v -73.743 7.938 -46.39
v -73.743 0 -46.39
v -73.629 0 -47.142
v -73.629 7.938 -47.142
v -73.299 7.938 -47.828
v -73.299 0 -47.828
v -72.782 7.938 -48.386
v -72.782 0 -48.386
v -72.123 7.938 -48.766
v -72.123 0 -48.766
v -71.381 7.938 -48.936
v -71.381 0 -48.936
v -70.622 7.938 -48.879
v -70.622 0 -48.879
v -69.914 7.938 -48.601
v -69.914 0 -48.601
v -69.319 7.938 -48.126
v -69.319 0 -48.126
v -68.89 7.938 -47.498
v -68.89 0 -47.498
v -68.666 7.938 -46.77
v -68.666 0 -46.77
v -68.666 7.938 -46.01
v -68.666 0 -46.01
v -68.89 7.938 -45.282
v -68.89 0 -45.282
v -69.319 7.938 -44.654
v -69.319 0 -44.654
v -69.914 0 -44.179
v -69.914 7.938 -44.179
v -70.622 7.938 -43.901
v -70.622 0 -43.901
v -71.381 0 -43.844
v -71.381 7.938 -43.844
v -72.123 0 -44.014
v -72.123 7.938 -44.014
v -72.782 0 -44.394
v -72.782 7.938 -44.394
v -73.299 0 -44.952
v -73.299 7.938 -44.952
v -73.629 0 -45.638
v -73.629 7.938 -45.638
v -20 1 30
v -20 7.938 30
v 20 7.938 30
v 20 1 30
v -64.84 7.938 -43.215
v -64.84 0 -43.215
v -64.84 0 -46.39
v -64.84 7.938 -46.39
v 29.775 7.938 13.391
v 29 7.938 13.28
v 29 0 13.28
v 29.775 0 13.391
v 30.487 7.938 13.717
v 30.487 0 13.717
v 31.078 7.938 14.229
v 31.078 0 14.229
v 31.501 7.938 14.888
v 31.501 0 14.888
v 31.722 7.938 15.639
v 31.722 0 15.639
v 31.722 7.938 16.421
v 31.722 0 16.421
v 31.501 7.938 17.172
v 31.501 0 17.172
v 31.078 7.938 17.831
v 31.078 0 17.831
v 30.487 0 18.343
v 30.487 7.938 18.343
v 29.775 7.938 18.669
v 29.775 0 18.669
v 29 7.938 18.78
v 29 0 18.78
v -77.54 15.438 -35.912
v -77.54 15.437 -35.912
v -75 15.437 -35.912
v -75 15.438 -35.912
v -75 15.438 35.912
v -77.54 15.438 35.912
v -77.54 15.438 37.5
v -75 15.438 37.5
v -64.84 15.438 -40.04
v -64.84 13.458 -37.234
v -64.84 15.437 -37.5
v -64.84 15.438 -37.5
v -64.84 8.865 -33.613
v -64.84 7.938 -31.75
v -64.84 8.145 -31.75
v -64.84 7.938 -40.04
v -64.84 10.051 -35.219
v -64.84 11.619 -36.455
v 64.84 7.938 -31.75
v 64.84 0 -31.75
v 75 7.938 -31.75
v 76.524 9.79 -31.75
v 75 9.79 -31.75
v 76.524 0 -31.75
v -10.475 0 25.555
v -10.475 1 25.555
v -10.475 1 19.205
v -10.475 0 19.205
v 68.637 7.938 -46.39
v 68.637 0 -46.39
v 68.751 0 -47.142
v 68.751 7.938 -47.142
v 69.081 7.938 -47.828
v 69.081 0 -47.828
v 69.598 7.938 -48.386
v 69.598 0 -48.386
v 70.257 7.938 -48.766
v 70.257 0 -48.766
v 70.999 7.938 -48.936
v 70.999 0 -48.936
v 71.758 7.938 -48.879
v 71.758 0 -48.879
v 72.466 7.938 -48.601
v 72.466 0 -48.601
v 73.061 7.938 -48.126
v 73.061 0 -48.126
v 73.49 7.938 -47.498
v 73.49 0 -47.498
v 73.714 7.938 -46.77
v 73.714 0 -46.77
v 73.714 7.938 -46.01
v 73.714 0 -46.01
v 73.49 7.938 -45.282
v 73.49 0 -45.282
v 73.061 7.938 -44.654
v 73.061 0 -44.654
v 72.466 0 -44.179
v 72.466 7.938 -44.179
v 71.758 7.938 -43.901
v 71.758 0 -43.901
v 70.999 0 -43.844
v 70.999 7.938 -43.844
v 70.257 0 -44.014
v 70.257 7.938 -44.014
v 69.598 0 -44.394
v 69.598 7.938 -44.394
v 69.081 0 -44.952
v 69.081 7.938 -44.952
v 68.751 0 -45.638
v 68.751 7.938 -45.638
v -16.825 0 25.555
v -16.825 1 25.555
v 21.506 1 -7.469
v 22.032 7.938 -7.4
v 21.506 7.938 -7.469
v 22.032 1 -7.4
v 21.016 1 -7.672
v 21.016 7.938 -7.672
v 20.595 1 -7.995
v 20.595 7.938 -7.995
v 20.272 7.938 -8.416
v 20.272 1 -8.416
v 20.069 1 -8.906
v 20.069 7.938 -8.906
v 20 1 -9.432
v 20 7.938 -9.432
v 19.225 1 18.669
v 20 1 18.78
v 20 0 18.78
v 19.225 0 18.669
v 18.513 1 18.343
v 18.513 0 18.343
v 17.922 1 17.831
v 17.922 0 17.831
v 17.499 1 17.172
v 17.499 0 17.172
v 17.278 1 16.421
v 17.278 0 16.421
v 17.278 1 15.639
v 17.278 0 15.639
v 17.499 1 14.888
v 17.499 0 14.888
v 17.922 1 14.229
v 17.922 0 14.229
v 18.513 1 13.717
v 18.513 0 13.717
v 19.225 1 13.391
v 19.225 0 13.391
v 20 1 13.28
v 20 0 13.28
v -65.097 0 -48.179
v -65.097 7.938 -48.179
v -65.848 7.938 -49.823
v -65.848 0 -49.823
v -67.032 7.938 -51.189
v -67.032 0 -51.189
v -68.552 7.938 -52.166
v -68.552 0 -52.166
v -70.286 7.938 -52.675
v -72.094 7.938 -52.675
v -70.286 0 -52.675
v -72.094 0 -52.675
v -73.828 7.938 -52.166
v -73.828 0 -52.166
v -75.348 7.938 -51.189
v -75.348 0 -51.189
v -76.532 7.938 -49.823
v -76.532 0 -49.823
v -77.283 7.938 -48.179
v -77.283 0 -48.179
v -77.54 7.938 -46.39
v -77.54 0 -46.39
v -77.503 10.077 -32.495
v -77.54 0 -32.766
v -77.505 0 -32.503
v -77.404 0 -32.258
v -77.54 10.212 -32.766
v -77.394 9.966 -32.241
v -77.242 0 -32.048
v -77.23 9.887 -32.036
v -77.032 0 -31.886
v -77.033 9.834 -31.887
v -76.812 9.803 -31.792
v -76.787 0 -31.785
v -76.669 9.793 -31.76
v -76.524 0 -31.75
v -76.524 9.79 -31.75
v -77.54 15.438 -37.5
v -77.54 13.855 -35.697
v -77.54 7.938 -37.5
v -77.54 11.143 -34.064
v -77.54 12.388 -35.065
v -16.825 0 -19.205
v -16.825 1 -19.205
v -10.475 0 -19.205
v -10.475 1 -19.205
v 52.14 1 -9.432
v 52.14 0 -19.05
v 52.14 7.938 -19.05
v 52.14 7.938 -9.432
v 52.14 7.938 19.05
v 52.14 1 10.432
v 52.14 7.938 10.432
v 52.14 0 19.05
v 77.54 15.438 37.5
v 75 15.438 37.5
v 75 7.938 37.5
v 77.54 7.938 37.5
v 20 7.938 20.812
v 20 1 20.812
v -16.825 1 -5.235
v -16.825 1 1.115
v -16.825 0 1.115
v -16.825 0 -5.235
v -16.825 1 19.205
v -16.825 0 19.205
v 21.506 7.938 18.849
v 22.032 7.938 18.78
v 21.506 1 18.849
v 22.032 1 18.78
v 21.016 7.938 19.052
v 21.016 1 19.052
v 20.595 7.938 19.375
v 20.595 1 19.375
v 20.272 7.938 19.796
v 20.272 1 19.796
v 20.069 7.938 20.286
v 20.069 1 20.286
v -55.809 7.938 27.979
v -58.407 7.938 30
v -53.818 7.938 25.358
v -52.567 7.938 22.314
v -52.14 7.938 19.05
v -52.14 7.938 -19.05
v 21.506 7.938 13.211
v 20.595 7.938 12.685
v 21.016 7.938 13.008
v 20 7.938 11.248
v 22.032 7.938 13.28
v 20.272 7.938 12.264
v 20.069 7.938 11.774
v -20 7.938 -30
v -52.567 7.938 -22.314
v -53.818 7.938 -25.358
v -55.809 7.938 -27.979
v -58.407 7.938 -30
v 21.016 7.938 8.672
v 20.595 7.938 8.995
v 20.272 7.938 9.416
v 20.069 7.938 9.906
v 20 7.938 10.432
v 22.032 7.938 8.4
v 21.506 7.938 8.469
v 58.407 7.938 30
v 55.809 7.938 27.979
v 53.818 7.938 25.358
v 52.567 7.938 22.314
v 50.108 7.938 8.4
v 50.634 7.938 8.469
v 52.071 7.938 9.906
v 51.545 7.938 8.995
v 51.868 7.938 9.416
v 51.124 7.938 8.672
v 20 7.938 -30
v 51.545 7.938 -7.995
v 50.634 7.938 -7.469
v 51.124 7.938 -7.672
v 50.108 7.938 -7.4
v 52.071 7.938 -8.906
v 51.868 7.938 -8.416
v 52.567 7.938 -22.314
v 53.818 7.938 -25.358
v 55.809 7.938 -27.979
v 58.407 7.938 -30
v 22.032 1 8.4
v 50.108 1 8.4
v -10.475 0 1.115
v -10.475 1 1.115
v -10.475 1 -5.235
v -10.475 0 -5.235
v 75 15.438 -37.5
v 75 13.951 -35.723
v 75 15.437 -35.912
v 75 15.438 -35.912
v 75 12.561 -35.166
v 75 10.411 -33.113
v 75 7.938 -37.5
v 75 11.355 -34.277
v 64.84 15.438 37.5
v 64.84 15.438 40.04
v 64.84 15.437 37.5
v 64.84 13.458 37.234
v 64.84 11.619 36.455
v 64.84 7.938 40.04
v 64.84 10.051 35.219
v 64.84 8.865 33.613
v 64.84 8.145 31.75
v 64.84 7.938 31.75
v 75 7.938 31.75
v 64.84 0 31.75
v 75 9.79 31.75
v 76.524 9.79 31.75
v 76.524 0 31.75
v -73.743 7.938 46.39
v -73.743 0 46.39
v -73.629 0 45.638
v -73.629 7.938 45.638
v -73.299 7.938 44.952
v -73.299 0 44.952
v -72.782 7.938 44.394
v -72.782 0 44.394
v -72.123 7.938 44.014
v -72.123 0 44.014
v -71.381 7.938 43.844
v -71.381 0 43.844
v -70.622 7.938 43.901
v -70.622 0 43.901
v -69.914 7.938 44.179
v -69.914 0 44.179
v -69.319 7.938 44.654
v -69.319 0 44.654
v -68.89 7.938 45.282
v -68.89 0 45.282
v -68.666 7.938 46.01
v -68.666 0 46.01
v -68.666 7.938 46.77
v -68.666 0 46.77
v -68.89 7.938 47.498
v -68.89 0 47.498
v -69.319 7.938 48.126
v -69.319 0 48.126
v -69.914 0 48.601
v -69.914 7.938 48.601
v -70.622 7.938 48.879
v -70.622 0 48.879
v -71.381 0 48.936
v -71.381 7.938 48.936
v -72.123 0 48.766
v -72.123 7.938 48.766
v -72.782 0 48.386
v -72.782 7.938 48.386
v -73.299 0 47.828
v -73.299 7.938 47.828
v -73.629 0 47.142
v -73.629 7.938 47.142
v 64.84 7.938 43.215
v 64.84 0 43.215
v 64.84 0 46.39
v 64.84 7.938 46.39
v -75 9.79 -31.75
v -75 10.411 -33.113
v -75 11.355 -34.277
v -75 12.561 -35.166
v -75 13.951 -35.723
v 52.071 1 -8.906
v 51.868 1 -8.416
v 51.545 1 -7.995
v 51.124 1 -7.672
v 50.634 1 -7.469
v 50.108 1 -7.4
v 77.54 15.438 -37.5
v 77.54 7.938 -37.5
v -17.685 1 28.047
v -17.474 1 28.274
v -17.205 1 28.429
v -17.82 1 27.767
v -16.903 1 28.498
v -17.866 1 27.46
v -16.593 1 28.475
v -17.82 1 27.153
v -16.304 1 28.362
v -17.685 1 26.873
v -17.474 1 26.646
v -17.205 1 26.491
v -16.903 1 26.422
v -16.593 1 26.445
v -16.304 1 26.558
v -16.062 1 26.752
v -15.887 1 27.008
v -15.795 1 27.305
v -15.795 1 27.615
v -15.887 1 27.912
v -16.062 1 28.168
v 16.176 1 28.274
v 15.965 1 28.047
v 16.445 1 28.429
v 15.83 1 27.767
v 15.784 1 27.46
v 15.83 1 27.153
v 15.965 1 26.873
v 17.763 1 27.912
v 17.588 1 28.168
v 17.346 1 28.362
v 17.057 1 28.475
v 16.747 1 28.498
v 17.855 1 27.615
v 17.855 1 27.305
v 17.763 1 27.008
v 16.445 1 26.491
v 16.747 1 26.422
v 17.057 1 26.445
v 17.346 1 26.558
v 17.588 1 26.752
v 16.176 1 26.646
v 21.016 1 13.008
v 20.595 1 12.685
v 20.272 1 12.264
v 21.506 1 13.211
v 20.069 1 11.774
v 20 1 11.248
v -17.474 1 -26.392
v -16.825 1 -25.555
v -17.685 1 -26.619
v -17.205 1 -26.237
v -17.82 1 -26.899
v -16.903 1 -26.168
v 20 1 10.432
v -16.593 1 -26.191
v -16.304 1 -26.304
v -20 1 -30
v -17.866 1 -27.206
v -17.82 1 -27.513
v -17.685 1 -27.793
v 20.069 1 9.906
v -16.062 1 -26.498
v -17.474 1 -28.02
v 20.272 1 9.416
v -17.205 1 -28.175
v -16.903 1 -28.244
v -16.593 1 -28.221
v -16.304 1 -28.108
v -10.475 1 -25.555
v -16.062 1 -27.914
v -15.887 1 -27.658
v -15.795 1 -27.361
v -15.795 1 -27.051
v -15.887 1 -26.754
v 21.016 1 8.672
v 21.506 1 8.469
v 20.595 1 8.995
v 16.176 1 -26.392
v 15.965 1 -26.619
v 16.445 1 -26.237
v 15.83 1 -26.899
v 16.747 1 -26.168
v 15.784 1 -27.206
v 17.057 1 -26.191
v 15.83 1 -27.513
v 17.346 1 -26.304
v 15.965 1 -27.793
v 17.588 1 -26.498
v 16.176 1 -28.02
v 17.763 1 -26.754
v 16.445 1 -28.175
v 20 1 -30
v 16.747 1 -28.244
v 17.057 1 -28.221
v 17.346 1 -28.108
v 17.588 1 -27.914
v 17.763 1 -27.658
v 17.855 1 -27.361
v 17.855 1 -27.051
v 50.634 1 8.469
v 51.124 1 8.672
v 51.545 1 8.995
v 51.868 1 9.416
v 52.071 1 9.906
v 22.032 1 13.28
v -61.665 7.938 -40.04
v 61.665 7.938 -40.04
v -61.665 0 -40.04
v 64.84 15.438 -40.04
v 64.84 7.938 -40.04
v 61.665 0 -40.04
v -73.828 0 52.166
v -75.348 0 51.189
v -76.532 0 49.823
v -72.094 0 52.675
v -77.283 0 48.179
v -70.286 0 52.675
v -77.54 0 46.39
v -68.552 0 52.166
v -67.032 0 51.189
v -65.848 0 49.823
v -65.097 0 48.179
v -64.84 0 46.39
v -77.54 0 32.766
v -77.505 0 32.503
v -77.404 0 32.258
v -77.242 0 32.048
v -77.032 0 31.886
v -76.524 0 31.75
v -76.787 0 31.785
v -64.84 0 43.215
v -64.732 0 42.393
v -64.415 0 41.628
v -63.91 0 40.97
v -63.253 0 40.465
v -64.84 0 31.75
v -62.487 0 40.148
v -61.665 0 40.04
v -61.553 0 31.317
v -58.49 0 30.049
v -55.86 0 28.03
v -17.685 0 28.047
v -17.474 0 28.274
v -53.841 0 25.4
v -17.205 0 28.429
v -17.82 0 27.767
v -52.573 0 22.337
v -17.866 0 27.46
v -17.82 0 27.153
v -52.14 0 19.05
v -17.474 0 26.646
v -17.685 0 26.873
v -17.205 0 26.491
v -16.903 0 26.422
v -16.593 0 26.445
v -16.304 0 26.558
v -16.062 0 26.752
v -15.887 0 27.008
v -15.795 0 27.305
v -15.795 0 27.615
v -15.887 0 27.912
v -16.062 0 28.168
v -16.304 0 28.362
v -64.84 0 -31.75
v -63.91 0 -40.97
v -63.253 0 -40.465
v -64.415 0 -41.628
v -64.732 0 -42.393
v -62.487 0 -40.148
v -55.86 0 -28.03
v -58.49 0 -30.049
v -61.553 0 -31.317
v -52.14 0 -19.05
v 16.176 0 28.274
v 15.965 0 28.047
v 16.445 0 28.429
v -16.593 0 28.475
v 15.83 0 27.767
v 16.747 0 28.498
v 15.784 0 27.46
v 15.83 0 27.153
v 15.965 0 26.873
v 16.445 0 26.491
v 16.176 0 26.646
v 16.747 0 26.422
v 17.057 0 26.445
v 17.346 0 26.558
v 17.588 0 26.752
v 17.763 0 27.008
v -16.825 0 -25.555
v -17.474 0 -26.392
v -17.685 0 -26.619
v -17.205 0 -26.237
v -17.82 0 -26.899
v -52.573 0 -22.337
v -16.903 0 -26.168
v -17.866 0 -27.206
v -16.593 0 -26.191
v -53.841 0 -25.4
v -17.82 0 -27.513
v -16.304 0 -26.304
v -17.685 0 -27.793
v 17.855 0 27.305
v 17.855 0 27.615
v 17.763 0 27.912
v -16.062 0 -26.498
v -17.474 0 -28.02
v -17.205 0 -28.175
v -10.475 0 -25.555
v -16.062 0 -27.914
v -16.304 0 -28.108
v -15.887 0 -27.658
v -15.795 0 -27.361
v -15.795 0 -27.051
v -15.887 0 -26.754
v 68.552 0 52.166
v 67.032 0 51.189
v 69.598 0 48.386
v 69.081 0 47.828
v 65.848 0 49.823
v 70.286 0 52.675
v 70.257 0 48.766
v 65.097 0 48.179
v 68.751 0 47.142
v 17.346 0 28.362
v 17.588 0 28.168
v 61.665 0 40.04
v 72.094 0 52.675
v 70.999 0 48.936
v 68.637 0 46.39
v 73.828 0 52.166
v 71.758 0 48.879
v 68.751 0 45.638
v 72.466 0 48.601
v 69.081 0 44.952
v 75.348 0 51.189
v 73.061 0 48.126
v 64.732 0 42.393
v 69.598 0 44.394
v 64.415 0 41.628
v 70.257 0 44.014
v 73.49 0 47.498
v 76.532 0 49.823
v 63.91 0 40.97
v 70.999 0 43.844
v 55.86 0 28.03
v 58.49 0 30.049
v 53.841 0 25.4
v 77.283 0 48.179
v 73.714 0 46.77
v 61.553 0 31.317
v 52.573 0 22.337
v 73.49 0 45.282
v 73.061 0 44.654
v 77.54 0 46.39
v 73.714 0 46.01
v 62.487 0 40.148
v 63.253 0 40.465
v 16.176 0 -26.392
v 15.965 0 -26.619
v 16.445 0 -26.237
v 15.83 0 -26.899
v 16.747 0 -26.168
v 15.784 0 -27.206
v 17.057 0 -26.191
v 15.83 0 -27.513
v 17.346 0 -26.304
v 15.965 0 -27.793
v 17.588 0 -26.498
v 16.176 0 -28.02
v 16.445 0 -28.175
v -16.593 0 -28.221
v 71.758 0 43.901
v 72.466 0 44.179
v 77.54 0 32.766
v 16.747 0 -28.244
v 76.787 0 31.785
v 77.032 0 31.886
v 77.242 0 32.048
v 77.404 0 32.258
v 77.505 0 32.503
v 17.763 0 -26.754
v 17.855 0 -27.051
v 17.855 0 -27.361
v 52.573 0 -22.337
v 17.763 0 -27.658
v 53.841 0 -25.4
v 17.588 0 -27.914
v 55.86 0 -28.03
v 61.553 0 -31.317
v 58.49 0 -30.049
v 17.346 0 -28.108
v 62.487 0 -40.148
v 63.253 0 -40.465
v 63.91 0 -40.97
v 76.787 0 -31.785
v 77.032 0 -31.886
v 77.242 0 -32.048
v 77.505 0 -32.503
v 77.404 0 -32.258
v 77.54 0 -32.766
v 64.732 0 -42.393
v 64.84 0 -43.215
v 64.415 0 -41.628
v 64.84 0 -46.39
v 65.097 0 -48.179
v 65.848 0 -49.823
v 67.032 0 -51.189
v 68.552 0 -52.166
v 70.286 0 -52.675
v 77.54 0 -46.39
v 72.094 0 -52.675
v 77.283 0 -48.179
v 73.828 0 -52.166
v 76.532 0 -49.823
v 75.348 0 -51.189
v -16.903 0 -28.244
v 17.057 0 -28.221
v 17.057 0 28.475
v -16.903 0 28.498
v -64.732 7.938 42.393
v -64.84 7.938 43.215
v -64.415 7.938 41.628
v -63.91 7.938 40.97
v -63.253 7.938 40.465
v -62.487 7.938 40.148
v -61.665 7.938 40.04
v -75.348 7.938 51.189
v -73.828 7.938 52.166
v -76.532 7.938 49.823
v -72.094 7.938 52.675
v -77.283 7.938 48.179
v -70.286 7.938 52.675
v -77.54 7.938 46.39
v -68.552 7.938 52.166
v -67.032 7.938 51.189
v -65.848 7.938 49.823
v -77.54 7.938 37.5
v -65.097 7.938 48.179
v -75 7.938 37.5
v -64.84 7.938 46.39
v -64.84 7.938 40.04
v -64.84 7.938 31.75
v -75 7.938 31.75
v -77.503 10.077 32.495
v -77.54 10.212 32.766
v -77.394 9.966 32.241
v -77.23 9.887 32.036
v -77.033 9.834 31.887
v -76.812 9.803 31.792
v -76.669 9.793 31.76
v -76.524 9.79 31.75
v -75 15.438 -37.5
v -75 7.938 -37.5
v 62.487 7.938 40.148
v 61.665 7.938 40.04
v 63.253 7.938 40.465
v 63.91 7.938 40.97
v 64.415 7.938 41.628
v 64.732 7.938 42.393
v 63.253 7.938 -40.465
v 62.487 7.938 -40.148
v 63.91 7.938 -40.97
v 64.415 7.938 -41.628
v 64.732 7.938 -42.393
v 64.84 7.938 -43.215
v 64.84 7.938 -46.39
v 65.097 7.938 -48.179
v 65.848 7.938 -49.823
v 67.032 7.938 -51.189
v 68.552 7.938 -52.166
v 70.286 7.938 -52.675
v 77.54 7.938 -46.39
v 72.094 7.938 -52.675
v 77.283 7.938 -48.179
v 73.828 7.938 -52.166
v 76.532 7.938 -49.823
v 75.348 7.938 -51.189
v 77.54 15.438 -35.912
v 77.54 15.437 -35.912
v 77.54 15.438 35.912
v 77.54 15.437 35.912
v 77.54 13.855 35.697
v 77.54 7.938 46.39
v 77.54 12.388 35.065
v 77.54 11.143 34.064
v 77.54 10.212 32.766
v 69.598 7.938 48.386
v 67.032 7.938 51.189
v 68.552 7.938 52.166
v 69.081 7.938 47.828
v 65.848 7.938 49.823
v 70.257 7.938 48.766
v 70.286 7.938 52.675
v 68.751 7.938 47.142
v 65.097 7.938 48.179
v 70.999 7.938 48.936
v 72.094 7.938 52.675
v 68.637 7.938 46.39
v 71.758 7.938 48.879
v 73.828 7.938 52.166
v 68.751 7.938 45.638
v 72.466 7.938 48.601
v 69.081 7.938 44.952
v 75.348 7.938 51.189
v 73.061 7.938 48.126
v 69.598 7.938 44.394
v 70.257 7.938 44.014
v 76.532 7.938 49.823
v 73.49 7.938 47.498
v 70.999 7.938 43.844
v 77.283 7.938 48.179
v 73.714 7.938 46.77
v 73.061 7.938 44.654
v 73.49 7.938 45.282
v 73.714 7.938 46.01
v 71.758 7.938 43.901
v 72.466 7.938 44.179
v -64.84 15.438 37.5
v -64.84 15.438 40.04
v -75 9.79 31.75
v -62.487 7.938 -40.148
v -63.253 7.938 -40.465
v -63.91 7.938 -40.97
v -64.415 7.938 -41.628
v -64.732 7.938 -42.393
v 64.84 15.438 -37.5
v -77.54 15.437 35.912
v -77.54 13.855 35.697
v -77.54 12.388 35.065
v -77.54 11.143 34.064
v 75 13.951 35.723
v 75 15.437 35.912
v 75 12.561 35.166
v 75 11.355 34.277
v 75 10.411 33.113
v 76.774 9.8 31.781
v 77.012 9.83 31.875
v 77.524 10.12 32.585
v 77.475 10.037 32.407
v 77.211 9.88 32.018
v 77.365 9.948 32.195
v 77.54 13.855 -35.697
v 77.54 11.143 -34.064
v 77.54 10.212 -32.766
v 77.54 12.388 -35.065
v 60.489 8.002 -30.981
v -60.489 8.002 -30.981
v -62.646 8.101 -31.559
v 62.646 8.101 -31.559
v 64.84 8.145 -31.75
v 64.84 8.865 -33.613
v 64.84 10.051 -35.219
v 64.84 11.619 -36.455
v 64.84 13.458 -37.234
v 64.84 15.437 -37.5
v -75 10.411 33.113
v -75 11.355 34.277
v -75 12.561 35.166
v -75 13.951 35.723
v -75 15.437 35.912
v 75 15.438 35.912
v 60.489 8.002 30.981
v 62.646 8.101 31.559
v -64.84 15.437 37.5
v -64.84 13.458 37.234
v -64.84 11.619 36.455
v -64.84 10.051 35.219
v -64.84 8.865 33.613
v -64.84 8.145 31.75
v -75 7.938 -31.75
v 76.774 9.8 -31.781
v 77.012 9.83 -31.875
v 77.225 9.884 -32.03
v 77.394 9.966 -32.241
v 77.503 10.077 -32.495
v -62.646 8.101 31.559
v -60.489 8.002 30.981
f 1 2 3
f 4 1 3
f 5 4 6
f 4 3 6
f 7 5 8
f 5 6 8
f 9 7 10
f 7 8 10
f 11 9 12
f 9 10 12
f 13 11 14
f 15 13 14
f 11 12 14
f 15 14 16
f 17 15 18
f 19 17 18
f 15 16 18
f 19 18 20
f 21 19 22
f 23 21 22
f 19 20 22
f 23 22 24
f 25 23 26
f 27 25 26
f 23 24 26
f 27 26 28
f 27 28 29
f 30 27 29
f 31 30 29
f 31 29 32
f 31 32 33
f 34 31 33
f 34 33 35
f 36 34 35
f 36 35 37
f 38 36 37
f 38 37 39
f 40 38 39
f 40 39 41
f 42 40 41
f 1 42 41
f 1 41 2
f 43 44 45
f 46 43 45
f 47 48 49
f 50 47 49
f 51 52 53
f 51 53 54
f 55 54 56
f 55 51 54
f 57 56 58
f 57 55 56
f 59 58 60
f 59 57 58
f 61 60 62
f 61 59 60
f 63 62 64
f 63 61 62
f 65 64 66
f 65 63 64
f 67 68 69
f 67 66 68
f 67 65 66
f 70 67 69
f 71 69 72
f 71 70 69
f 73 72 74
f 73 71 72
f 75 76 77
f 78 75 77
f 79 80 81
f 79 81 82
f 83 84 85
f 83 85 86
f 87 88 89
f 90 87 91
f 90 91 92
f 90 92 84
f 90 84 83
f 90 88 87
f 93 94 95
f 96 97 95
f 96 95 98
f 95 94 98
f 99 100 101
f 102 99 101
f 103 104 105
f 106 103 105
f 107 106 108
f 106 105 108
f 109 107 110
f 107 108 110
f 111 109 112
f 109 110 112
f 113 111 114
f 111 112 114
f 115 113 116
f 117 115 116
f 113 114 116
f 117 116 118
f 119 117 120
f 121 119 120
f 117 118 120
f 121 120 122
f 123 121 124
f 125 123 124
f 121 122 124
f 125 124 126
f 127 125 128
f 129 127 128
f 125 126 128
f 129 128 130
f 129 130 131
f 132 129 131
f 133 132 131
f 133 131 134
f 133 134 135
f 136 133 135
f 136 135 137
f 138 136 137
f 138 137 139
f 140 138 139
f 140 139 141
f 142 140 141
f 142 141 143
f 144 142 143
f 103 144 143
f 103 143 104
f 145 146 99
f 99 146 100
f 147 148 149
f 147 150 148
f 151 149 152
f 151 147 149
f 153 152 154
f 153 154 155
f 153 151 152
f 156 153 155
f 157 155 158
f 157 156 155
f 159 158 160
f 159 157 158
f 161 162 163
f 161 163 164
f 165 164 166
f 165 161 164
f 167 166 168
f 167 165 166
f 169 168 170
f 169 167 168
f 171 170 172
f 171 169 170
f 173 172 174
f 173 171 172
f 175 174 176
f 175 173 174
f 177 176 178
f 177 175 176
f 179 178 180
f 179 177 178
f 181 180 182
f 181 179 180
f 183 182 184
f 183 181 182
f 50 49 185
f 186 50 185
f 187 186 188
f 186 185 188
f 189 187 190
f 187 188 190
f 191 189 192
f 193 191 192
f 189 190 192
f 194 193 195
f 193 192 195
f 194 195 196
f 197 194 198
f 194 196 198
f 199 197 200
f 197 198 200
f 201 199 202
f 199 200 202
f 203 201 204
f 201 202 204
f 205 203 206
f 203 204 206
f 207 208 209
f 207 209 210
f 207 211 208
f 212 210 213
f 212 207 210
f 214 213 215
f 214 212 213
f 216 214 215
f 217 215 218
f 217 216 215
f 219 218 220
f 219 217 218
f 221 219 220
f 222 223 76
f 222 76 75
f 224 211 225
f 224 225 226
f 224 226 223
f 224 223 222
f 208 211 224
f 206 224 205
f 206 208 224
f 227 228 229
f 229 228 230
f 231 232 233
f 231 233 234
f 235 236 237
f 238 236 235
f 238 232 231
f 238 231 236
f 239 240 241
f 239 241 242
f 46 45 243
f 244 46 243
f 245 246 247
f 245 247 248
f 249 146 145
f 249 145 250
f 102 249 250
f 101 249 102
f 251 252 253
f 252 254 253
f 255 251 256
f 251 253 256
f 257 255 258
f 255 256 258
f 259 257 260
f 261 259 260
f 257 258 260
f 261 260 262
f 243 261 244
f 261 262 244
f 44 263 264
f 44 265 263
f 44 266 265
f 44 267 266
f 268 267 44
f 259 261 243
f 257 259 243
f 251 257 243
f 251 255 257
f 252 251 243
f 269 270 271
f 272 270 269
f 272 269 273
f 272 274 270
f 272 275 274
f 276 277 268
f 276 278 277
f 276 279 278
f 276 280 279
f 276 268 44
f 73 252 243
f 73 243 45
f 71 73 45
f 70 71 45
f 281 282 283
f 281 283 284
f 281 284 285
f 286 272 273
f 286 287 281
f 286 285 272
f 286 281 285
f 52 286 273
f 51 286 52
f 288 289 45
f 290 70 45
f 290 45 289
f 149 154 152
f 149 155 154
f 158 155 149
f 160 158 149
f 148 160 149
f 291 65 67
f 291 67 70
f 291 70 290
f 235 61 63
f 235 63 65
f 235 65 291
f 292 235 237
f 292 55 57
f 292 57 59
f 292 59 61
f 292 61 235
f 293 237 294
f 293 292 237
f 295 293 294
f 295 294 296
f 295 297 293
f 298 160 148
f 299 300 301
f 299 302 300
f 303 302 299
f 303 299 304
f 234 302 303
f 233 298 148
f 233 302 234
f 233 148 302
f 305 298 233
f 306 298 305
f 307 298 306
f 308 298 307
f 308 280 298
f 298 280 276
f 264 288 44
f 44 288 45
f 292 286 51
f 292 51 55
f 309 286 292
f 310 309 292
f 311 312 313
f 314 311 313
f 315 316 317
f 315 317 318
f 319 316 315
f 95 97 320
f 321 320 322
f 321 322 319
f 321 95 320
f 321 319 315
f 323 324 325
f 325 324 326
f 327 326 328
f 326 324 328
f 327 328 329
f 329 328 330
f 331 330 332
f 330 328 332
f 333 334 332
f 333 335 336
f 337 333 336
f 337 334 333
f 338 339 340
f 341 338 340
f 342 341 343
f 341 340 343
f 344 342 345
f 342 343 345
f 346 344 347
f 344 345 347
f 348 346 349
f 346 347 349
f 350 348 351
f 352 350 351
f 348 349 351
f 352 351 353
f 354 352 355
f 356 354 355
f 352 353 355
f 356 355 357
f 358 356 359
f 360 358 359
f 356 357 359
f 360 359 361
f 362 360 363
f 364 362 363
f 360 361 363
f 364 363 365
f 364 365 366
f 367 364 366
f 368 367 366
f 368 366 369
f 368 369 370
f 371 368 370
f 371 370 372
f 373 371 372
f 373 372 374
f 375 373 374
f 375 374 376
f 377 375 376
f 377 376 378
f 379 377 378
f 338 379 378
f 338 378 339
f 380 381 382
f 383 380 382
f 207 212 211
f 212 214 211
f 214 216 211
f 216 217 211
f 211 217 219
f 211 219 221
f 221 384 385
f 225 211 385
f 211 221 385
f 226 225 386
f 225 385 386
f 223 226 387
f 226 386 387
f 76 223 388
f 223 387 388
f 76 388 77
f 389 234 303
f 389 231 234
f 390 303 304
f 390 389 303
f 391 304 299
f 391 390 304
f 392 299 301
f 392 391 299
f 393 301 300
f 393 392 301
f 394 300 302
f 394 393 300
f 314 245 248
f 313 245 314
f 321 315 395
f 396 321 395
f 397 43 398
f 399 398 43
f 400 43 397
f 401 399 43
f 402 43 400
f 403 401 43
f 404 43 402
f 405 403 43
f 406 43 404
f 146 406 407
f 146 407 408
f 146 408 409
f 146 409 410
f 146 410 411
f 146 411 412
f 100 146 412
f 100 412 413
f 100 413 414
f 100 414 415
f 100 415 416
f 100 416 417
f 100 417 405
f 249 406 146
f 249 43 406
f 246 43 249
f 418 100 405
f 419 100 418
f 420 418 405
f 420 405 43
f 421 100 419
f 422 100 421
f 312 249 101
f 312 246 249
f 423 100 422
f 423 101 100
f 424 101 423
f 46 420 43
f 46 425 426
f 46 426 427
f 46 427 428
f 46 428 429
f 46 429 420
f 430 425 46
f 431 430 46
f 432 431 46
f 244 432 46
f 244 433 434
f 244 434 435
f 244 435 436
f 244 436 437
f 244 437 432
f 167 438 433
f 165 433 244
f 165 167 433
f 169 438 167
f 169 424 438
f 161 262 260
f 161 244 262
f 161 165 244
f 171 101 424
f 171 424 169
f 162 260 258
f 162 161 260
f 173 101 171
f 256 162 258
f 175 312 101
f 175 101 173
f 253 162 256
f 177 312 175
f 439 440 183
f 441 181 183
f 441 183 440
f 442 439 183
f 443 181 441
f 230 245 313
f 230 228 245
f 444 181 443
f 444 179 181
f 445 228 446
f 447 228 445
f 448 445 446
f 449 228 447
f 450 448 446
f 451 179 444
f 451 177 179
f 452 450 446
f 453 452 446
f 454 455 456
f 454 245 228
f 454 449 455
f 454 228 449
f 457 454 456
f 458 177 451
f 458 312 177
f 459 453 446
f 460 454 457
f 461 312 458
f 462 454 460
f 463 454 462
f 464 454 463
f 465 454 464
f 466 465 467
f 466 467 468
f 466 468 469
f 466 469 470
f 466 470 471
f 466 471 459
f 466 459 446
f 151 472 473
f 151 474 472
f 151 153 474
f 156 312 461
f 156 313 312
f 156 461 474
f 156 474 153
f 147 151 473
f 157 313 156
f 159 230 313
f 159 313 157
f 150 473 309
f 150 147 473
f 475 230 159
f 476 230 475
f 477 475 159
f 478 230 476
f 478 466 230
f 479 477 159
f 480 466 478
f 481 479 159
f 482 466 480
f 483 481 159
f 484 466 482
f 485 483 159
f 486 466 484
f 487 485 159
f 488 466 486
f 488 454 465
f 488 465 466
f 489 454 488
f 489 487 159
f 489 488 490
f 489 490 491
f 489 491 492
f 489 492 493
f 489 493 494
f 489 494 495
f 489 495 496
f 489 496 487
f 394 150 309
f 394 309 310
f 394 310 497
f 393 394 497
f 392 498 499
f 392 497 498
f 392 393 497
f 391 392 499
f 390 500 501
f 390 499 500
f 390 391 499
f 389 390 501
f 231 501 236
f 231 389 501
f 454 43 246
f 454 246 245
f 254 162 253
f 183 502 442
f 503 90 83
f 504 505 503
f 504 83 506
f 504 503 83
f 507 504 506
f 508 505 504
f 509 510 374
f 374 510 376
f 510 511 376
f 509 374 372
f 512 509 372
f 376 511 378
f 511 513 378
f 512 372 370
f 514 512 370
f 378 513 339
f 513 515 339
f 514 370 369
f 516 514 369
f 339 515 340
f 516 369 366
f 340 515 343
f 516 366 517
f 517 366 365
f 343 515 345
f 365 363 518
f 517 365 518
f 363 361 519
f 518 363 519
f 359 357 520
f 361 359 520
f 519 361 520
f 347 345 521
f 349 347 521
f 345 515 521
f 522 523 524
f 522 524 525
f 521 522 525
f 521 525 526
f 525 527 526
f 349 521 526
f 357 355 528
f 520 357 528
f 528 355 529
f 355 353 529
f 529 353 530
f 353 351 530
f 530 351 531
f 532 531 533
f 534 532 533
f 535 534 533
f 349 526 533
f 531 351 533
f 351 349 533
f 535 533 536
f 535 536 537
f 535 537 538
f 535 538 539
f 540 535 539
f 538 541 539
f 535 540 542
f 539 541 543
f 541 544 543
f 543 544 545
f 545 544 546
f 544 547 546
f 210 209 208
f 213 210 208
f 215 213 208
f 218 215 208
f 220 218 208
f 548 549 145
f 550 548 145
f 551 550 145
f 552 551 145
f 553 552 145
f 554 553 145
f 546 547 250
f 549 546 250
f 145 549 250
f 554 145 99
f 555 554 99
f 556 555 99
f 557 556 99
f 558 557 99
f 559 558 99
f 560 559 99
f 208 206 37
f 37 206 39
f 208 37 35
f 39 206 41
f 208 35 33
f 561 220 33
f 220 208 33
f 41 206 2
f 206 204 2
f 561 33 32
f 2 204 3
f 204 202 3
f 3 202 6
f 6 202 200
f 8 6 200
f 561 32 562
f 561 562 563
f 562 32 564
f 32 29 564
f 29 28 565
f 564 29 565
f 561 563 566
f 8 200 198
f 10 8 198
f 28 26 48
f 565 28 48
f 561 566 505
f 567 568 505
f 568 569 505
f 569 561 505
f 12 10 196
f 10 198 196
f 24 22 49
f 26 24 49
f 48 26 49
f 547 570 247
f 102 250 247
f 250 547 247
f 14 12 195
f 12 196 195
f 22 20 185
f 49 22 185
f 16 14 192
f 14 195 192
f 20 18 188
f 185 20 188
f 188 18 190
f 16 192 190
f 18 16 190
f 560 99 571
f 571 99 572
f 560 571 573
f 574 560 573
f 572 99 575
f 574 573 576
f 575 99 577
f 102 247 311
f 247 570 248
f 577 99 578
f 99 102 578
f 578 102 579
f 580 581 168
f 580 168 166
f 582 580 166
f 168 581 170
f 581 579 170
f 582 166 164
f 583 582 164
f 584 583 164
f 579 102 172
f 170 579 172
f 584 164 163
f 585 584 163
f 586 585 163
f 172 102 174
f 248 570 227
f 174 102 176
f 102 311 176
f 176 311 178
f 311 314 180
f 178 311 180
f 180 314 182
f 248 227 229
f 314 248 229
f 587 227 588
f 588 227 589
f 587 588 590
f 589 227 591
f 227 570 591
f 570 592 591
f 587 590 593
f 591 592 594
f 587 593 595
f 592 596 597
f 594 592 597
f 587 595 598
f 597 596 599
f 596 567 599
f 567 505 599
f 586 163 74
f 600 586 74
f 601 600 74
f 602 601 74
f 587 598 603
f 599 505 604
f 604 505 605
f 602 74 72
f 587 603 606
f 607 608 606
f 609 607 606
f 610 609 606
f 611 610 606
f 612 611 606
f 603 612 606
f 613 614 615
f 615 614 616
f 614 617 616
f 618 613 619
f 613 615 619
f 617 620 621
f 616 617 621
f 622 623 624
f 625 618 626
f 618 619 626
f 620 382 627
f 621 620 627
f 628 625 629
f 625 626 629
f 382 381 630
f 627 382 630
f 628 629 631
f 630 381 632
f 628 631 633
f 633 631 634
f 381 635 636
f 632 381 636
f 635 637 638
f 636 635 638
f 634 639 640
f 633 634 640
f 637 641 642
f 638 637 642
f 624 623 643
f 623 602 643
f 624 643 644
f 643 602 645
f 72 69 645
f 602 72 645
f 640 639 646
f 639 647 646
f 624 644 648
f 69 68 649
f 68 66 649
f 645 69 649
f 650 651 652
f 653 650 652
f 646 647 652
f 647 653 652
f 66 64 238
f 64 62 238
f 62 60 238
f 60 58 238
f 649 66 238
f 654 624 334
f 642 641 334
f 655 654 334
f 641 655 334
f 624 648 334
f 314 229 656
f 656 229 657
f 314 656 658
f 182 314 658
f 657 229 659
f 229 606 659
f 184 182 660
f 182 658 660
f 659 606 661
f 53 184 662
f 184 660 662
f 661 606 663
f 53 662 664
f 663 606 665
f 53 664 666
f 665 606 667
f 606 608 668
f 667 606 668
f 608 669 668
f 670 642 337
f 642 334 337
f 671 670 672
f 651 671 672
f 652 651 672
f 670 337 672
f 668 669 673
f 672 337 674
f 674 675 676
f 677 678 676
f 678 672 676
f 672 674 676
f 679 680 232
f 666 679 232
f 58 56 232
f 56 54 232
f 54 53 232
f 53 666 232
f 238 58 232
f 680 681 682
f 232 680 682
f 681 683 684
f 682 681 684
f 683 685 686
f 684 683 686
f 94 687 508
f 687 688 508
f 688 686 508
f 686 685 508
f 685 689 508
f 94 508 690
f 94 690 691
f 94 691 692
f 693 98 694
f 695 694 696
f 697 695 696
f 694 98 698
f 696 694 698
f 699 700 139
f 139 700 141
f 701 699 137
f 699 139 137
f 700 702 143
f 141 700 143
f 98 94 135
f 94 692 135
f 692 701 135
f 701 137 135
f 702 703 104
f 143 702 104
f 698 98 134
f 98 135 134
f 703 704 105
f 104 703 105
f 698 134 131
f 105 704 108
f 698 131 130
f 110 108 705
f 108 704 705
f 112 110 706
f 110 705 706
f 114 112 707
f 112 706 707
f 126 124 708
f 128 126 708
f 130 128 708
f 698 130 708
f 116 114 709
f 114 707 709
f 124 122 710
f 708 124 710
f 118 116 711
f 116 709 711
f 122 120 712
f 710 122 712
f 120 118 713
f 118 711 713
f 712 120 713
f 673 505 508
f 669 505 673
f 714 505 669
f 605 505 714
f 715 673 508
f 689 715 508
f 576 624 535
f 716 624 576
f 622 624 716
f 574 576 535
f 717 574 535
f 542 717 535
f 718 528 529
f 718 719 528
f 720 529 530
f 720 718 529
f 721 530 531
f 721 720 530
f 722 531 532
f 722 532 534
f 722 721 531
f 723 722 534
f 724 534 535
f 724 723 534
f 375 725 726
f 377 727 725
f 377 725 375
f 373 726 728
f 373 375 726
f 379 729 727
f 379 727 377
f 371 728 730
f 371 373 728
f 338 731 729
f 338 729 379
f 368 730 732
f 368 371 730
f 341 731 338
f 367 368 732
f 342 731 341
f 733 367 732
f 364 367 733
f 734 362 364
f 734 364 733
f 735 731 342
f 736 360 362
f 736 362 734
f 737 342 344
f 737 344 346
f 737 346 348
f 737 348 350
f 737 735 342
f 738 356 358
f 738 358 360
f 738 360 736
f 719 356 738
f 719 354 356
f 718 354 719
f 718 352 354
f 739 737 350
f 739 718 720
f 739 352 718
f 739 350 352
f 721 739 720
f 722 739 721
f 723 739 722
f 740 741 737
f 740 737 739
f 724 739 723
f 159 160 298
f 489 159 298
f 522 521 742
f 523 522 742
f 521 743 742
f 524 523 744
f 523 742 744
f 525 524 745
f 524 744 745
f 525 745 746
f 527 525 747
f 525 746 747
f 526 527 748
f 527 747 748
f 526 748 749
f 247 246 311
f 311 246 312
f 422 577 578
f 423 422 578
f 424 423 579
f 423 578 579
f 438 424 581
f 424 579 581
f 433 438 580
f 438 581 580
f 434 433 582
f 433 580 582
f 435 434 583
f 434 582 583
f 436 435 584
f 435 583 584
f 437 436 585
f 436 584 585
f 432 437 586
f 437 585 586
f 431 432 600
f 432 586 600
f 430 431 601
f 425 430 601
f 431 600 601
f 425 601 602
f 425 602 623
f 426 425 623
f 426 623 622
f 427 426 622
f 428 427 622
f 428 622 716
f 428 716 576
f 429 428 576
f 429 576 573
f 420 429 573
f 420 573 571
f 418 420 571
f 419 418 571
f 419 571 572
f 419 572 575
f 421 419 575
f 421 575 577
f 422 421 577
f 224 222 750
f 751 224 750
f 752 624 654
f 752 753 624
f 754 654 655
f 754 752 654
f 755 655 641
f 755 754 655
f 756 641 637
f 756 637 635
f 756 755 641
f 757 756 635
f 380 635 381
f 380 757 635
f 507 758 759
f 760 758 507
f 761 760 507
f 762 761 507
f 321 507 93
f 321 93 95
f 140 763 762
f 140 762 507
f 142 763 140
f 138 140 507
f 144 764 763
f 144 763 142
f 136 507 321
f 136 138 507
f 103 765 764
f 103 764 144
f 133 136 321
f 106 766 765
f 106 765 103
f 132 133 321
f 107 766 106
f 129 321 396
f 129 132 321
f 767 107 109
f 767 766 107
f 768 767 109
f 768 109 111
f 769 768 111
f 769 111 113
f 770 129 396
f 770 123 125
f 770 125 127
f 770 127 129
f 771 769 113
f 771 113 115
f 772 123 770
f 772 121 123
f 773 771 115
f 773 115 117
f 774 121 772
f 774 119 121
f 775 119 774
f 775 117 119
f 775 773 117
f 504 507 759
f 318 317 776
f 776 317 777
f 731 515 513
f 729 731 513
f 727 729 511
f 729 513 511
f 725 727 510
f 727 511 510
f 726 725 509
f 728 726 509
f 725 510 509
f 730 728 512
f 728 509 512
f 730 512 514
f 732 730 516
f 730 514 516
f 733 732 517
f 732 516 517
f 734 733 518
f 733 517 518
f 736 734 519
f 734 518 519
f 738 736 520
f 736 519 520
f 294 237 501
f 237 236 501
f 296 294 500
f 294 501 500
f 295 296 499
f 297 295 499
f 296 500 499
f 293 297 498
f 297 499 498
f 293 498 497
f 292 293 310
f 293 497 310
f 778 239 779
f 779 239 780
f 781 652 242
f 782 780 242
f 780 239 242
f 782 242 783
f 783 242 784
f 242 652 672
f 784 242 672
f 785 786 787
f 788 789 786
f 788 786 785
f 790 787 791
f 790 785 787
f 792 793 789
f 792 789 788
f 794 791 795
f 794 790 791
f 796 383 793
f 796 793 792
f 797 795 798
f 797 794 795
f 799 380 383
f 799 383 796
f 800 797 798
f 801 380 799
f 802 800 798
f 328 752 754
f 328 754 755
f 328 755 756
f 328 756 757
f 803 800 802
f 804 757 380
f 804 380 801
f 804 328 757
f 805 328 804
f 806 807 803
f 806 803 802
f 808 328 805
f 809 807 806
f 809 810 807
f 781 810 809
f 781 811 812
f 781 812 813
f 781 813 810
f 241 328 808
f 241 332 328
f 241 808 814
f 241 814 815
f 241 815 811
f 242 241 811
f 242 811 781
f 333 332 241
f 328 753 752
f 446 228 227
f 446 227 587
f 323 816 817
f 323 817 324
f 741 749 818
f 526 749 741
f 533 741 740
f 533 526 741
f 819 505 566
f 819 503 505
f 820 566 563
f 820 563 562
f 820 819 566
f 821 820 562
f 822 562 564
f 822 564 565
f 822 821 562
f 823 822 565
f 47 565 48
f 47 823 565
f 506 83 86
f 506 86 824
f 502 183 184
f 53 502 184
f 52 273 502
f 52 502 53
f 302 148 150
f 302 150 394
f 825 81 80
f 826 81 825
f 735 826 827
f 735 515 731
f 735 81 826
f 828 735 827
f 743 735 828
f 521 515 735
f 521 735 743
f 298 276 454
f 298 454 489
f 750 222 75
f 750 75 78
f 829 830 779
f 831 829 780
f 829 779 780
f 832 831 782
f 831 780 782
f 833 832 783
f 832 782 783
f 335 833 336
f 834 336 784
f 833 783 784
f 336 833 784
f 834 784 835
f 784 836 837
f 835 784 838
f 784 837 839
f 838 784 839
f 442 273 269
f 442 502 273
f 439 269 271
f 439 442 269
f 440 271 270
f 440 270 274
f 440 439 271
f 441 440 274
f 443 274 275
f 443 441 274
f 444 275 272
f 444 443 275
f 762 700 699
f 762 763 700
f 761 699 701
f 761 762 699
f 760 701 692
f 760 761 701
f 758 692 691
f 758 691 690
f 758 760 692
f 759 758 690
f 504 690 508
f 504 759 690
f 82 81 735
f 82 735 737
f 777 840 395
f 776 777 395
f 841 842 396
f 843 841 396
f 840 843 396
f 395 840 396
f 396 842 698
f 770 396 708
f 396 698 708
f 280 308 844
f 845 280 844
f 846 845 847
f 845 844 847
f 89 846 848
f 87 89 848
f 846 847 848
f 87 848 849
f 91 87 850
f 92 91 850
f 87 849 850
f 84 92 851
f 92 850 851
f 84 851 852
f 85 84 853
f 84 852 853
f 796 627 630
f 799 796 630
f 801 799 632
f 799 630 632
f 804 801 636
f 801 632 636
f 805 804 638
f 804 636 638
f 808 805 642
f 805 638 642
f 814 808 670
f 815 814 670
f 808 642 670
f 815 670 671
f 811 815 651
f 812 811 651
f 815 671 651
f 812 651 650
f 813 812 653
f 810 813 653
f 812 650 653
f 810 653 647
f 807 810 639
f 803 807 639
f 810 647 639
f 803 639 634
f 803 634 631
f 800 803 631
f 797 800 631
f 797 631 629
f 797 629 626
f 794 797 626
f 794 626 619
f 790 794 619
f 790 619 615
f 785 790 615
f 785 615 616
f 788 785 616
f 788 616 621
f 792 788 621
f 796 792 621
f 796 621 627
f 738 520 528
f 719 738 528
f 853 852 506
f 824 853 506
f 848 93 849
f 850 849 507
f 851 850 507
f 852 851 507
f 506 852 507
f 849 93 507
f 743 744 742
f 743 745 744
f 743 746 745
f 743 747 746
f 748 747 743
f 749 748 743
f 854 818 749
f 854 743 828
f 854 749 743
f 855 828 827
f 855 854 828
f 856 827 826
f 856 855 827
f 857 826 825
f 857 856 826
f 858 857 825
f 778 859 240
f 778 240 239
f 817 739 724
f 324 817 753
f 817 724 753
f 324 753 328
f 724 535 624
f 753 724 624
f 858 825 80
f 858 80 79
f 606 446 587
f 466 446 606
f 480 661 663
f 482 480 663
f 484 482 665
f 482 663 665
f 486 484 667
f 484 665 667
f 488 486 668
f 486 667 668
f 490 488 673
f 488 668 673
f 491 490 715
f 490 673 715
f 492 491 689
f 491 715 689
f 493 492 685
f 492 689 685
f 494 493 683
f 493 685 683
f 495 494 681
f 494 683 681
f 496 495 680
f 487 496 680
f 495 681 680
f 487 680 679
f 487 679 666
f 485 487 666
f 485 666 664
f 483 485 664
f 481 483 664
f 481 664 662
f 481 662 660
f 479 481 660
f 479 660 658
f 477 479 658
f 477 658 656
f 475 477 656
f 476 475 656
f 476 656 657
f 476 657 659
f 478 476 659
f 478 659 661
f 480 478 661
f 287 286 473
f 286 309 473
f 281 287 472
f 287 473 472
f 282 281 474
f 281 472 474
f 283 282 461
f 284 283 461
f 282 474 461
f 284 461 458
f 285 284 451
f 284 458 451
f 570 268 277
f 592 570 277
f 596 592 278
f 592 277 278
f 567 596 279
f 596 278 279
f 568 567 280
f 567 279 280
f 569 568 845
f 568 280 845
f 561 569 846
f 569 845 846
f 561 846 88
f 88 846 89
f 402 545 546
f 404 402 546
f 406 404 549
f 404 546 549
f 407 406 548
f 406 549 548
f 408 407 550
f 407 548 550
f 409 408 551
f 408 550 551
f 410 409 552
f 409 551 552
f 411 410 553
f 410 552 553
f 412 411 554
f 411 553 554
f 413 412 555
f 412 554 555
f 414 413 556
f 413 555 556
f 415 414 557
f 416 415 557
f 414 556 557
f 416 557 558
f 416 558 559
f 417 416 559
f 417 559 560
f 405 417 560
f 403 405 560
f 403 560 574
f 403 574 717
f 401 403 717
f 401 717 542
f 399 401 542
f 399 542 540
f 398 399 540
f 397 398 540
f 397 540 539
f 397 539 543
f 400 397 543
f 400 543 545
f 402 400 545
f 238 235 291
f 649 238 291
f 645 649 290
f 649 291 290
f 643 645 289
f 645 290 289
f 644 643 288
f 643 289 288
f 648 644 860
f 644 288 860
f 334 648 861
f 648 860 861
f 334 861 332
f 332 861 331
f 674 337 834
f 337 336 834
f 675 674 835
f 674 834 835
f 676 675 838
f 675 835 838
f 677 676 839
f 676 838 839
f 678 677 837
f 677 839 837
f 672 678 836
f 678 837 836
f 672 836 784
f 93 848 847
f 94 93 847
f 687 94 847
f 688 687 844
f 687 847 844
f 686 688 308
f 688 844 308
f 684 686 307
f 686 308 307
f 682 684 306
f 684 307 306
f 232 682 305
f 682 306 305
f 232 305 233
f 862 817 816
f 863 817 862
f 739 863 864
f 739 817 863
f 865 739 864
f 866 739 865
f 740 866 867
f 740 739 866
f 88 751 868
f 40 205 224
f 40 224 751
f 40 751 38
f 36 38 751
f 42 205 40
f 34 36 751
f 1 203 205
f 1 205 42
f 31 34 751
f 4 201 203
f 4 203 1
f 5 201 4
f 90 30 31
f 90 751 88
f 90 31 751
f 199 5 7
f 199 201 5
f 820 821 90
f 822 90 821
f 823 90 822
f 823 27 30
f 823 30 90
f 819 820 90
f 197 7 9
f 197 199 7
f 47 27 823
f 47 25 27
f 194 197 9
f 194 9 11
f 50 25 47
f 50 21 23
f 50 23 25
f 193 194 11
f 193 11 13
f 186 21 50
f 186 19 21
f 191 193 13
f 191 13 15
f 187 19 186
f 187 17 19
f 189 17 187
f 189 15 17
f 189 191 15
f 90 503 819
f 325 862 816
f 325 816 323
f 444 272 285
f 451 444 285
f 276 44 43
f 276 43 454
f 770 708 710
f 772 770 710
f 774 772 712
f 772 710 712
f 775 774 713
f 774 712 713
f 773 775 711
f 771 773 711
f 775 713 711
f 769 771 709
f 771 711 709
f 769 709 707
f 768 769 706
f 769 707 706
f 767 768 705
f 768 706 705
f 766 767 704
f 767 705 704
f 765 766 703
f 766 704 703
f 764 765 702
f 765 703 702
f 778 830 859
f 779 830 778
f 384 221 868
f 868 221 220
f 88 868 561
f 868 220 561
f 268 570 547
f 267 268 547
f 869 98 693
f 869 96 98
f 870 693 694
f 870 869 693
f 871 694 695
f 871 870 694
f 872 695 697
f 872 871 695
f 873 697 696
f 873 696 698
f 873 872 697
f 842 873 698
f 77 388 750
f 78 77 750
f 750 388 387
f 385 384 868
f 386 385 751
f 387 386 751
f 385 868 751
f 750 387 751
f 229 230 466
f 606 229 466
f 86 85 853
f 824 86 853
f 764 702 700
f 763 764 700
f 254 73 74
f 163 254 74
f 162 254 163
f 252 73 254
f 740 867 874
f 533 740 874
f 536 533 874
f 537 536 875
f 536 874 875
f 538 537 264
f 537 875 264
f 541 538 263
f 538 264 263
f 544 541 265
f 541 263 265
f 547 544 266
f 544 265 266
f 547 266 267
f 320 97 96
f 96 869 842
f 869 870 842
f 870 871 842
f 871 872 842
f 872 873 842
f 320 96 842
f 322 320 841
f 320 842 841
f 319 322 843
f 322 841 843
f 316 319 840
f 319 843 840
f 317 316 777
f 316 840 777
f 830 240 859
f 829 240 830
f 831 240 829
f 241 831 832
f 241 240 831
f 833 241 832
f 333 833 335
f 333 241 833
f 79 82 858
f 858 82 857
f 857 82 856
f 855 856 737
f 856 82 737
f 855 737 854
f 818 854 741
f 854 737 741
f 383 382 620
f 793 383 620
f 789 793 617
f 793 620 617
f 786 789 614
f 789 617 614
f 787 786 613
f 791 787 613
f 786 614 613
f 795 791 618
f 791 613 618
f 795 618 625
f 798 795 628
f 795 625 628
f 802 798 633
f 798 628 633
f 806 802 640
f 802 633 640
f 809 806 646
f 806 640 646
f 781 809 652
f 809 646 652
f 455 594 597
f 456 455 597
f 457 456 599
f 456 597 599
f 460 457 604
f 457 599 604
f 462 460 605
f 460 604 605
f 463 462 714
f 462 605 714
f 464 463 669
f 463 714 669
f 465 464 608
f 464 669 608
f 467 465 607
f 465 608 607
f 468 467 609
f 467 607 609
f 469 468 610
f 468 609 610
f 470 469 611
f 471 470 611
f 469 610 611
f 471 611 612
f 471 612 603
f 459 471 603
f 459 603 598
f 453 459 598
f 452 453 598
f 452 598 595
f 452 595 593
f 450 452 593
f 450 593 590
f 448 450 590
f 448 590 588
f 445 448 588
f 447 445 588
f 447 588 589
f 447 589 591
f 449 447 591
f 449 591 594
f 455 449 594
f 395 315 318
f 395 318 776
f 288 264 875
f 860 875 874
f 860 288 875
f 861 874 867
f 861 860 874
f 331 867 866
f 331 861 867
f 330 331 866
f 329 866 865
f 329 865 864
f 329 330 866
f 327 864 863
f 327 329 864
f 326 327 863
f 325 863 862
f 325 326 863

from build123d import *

# Parameters (mm, degrees)
BOSS_EXTRUDE1_DEPTH         = 7.9375
F_10_CLEARANCE_HOLE1_D      = 5.1054
SKETCH8_W                   = 2.54
SKETCH8_H                   = 1.5875
SKETCH8_W_2                 = 129.68
SKETCH8_H_2                 = 2.54
BOSS_EXTRUDE2_DEPTH         = 7.5
SKETCH10_W                  = 2.54
SKETCH10_H                  = 71.825
BOSS_EXTRUDE3_DEPTH         = 1.5875
FILLET3_R                   = 3.175
FILLET4_R                   = 5.9125
FILLET5_R                   = 7.5
SKETCH11_W                  = 25.4
SKETCH11_H                  = 63.5
CUT_EXTRUDE1_DEPTH          = 96.03828495
FILLET6_R                   = 12.7
SKETCH12_W                  = 40
SKETCH12_H                  = 60
CUT_EXTRUDE2_DEPTH          = 6.9375
SKETCH13_W                  = 57.54
SKETCH13_H                  = 15.8
CUT_EXTRUDE3_DEPTH          = 6.9375
CUT_EXTRUDE4_DEPTH          = 95.111439835
SKETCH15_W                  = 6.35
SKETCH15_H                  = 6.35
CUT_EXTRUDE5_DEPTH          = 95.880981267
FILLET7_R                   = 2.032
F_45_0_082_DIAMETER_HOLE1_D = 2.0828
FILLET8_R                   = 1.016


with BuildPart() as part:
    # Sketch1 → Boss-Extrude1 (new body)
    with BuildSketch(Plane(origin=(0, 0, 0), x_dir=(1, 0, 0), z_dir=(0, 1, 0))):
        with BuildLine():
            Line((77.54, -40.04), (77.54, 40.04))
            Line((77.54, 40.04), (77.54, 46.39))
            ThreePointArc((77.54, 46.39), (71.19, 52.74), (64.84, 46.39))
            Line((64.84, 46.39), (64.84, 40.04))
            Line((64.84, 40.04), (-64.84, 40.04))
            Line((-64.84, 40.04), (-64.84, 46.39))
            ThreePointArc((-64.84, 46.39), (-71.19, 52.74), (-77.54, 46.39))
            Line((-77.54, 46.39), (-77.54, 40.04))
            Line((-77.54, 40.04), (-77.54, -40.04))
            Line((-77.54, -40.04), (-77.54, -46.39))
            ThreePointArc((-77.54, -46.39), (-71.19, -52.74), (-64.84, -46.39))
            Line((-64.84, -46.39), (-64.84, -40.04))
            Line((-64.84, -40.04), (64.84, -40.04))
            Line((64.84, -40.04), (64.84, -46.39))
            ThreePointArc((64.84, -46.39), (71.19, -52.74), (77.54, -46.39))
            Line((77.54, -46.39), (77.54, -40.04))
        make_face()
    extrude(amount=BOSS_EXTRUDE1_DEPTH)

    # #10 Clearance Hole1 (through all)
    with Locations(Plane(origin=(0, 7.9375, 0), x_dir=(1, 0, 0), z_dir=(0, 1, 0))):
        with Locations((-71.19, 46.39), (71.19, 46.39), (71.19, -46.39), (-71.19, -46.39)):
            Hole(F_10_CLEARANCE_HOLE1_D / 2)

    # Sketch8 → Boss-Extrude2 (add)
    with BuildSketch(Plane(origin=(0, 7.9375, 0), x_dir=(1, 0, 0), z_dir=(0, 1, 0))):
        with Locations((-76.27, 36.70625)):
            Rectangle(SKETCH8_W, SKETCH8_H)
        with Locations((76.27, 36.70625)):
            Rectangle(SKETCH8_W, SKETCH8_H)
        with Locations((76.27, -36.70625)):
            Rectangle(SKETCH8_W, SKETCH8_H)
        with Locations((-76.27, -36.70625)):
            Rectangle(SKETCH8_W, SKETCH8_H)
        with Locations((0, 38.77)):
            Rectangle(SKETCH8_W_2, SKETCH8_H_2)
        with Locations((0, -38.77)):
            Rectangle(SKETCH8_W_2, SKETCH8_H_2)
    extrude(amount=BOSS_EXTRUDE2_DEPTH)

    # Sketch10 → Boss-Extrude3 (add)
    with BuildSketch(Plane(origin=(0, 7.9375, 0), x_dir=(1, 0, 0), z_dir=(0, 1, 0))):
        with Locations((-76.27, 0)):
            Rectangle(SKETCH10_W, SKETCH10_H)
        with Locations((76.27, 0)):
            Rectangle(SKETCH10_W, SKETCH10_H)
    extrude(amount=BOSS_EXTRUDE3_DEPTH)

    # Fillet3
    fillet3_edges = [part.edges().sort_by_distance(p)[0] for p in [
        (64.84, 3.96875, 40.04),
        (-64.84, 3.96875, 40.04),
        (-64.84, 3.96875, -40.04),
        (64.84, 3.96875, -40.04),
    ]]
    fillet(fillet3_edges, radius=FILLET3_R)

    # Fillet4
    fillet4_edges = [part.edges().sort_by_distance(p)[0] for p in [
        (76.27, 9.525, 35.9125),
        (76.27, 9.525, -35.9125),
        (-76.27, 9.525, 35.9125),
        (-76.27, 9.525, -35.9125),
    ]]
    fillet(fillet4_edges, radius=FILLET4_R - 0.0001)  # a hair under: the kernel refuses the full size

    # Fillet5
    fillet5_edges = [part.edges().sort_by_distance(p)[0] for p in [
        (0, 7.9375, 37.5),
        (0, 7.9375, -37.5),
    ]]
    fillet(fillet5_edges, radius=FILLET5_R - 0.0001)  # a hair under: the kernel refuses the full size

    # Sketch11 → Cut-Extrude1 (cut, through all)
    with BuildSketch(Plane.XZ):
        with Locations((-64.84, 0)):
            Rectangle(SKETCH11_W, SKETCH11_H)
        with Locations((64.84, 0)):
            Rectangle(SKETCH11_W, SKETCH11_H)
    extrude(amount=-CUT_EXTRUDE1_DEPTH, mode=Mode.SUBTRACT)

    # Fillet6
    fillet6_edges = [part.edges().sort_by_distance(p)[0] for p in [
        (-52.14, 4.072251385, 31.75),
    ]]
    fillet(fillet6_edges, radius=FILLET6_R)
    fillet6_2_edges = [part.edges().sort_by_distance(p)[0] for p in [
        (-52.14, 4.072251385, -31.75),
    ]]
    fillet(fillet6_2_edges, radius=FILLET6_R)
    fillet6_3_edges = [part.edges().sort_by_distance(p)[0] for p in [
        (52.14, 4.072251385, -31.75),
    ]]
    fillet(fillet6_3_edges, radius=FILLET6_R)
    fillet6_4_edges = [part.edges().sort_by_distance(p)[0] for p in [
        (52.14, 4.072251385, 31.75),
    ]]
    fillet(fillet6_4_edges, radius=FILLET6_R)

    # Sketch12 → Cut-Extrude2 (cut)
    with BuildSketch(Plane(origin=(0, 7.9375, 0), x_dir=(1, 0, 0), z_dir=(0, 1, 0))):
        Rectangle(SKETCH12_W, SKETCH12_H)
    extrude(amount=-CUT_EXTRUDE2_DEPTH, mode=Mode.SUBTRACT)

    # Sketch13 → Cut-Extrude3 (cut)
    with BuildSketch(Plane(origin=(0, 7.9375, 0), x_dir=(1, 0, 0), z_dir=(0, 1, 0))):
        with Locations((48.77, -0.5)):
            Rectangle(SKETCH13_W, SKETCH13_H)
    extrude(amount=-CUT_EXTRUDE3_DEPTH, mode=Mode.SUBTRACT)

    # Sketch14 → Cut-Extrude4 (cut, through all)
    with BuildSketch(Plane(origin=(0, 7.9375, 0), x_dir=(1, 0, 0), z_dir=(0, 1, 0))):
        with BuildLine():
            Line((29, -18.78), (20, -18.78))
            ThreePointArc((20, -18.78), (17.25, -16.03), (20, -13.28))
            Line((20, -13.28), (29, -13.28))
            ThreePointArc((29, -13.28), (31.75, -16.03), (29, -18.78))
        make_face()
    extrude(amount=-CUT_EXTRUDE4_DEPTH, mode=Mode.SUBTRACT)

    # Sketch15 → Cut-Extrude5 (cut, through all)
    with BuildSketch(Plane(origin=(0, 1, 0), x_dir=(1, 0, 0), z_dir=(0, 1, 0))):
        with Locations((-13.65, 2.06)):
            Rectangle(SKETCH15_W, SKETCH15_H)
        with Locations((-13.65, 22.38)):
            Rectangle(SKETCH15_W, SKETCH15_H)
        with Locations((-13.65, -22.38)):
            Rectangle(SKETCH15_W, SKETCH15_H)
    extrude(amount=-CUT_EXTRUDE5_DEPTH, mode=Mode.SUBTRACT)

    # Fillet7
    fillet7_edges = [part.edges().sort_by_distance(p)[0] for p in [
        (52.14, 4.46875, -7.4),
        (20, 4.46875, -7.4),
        (52.14, 4.46875, 8.4),
        (20, 4.46875, 8.4),
        (20, 4.46875, 18.78),
        (20, 4.46875, 13.28),
    ]]
    fillet(fillet7_edges, radius=FILLET7_R)

    # #45 (0.082) Diameter Hole1 (through all)
    with Locations(Plane(origin=(0, 1, 0), x_dir=(1, 0, 0), z_dir=(0, 1, 0))):
        with Locations((-16.825, 27.206), (16.825, -27.46), (-16.825, -27.46), (16.825, 27.206)):
            Hole(F_45_0_082_DIAMETER_HOLE1_D / 2)

    # Fillet8
    fillet8_edges = [part.edges().sort_by_distance(p)[0] for p in [
        (-77.54, 4.894947012, -31.75),
        (-77.54, 4.894947012, 31.75),
        (77.54, 4.894947012, 31.75),
        (77.54, 4.894947012, -31.75),
    ]]
    fillet(fillet8_edges, radius=FILLET8_R)


solid = part.part
